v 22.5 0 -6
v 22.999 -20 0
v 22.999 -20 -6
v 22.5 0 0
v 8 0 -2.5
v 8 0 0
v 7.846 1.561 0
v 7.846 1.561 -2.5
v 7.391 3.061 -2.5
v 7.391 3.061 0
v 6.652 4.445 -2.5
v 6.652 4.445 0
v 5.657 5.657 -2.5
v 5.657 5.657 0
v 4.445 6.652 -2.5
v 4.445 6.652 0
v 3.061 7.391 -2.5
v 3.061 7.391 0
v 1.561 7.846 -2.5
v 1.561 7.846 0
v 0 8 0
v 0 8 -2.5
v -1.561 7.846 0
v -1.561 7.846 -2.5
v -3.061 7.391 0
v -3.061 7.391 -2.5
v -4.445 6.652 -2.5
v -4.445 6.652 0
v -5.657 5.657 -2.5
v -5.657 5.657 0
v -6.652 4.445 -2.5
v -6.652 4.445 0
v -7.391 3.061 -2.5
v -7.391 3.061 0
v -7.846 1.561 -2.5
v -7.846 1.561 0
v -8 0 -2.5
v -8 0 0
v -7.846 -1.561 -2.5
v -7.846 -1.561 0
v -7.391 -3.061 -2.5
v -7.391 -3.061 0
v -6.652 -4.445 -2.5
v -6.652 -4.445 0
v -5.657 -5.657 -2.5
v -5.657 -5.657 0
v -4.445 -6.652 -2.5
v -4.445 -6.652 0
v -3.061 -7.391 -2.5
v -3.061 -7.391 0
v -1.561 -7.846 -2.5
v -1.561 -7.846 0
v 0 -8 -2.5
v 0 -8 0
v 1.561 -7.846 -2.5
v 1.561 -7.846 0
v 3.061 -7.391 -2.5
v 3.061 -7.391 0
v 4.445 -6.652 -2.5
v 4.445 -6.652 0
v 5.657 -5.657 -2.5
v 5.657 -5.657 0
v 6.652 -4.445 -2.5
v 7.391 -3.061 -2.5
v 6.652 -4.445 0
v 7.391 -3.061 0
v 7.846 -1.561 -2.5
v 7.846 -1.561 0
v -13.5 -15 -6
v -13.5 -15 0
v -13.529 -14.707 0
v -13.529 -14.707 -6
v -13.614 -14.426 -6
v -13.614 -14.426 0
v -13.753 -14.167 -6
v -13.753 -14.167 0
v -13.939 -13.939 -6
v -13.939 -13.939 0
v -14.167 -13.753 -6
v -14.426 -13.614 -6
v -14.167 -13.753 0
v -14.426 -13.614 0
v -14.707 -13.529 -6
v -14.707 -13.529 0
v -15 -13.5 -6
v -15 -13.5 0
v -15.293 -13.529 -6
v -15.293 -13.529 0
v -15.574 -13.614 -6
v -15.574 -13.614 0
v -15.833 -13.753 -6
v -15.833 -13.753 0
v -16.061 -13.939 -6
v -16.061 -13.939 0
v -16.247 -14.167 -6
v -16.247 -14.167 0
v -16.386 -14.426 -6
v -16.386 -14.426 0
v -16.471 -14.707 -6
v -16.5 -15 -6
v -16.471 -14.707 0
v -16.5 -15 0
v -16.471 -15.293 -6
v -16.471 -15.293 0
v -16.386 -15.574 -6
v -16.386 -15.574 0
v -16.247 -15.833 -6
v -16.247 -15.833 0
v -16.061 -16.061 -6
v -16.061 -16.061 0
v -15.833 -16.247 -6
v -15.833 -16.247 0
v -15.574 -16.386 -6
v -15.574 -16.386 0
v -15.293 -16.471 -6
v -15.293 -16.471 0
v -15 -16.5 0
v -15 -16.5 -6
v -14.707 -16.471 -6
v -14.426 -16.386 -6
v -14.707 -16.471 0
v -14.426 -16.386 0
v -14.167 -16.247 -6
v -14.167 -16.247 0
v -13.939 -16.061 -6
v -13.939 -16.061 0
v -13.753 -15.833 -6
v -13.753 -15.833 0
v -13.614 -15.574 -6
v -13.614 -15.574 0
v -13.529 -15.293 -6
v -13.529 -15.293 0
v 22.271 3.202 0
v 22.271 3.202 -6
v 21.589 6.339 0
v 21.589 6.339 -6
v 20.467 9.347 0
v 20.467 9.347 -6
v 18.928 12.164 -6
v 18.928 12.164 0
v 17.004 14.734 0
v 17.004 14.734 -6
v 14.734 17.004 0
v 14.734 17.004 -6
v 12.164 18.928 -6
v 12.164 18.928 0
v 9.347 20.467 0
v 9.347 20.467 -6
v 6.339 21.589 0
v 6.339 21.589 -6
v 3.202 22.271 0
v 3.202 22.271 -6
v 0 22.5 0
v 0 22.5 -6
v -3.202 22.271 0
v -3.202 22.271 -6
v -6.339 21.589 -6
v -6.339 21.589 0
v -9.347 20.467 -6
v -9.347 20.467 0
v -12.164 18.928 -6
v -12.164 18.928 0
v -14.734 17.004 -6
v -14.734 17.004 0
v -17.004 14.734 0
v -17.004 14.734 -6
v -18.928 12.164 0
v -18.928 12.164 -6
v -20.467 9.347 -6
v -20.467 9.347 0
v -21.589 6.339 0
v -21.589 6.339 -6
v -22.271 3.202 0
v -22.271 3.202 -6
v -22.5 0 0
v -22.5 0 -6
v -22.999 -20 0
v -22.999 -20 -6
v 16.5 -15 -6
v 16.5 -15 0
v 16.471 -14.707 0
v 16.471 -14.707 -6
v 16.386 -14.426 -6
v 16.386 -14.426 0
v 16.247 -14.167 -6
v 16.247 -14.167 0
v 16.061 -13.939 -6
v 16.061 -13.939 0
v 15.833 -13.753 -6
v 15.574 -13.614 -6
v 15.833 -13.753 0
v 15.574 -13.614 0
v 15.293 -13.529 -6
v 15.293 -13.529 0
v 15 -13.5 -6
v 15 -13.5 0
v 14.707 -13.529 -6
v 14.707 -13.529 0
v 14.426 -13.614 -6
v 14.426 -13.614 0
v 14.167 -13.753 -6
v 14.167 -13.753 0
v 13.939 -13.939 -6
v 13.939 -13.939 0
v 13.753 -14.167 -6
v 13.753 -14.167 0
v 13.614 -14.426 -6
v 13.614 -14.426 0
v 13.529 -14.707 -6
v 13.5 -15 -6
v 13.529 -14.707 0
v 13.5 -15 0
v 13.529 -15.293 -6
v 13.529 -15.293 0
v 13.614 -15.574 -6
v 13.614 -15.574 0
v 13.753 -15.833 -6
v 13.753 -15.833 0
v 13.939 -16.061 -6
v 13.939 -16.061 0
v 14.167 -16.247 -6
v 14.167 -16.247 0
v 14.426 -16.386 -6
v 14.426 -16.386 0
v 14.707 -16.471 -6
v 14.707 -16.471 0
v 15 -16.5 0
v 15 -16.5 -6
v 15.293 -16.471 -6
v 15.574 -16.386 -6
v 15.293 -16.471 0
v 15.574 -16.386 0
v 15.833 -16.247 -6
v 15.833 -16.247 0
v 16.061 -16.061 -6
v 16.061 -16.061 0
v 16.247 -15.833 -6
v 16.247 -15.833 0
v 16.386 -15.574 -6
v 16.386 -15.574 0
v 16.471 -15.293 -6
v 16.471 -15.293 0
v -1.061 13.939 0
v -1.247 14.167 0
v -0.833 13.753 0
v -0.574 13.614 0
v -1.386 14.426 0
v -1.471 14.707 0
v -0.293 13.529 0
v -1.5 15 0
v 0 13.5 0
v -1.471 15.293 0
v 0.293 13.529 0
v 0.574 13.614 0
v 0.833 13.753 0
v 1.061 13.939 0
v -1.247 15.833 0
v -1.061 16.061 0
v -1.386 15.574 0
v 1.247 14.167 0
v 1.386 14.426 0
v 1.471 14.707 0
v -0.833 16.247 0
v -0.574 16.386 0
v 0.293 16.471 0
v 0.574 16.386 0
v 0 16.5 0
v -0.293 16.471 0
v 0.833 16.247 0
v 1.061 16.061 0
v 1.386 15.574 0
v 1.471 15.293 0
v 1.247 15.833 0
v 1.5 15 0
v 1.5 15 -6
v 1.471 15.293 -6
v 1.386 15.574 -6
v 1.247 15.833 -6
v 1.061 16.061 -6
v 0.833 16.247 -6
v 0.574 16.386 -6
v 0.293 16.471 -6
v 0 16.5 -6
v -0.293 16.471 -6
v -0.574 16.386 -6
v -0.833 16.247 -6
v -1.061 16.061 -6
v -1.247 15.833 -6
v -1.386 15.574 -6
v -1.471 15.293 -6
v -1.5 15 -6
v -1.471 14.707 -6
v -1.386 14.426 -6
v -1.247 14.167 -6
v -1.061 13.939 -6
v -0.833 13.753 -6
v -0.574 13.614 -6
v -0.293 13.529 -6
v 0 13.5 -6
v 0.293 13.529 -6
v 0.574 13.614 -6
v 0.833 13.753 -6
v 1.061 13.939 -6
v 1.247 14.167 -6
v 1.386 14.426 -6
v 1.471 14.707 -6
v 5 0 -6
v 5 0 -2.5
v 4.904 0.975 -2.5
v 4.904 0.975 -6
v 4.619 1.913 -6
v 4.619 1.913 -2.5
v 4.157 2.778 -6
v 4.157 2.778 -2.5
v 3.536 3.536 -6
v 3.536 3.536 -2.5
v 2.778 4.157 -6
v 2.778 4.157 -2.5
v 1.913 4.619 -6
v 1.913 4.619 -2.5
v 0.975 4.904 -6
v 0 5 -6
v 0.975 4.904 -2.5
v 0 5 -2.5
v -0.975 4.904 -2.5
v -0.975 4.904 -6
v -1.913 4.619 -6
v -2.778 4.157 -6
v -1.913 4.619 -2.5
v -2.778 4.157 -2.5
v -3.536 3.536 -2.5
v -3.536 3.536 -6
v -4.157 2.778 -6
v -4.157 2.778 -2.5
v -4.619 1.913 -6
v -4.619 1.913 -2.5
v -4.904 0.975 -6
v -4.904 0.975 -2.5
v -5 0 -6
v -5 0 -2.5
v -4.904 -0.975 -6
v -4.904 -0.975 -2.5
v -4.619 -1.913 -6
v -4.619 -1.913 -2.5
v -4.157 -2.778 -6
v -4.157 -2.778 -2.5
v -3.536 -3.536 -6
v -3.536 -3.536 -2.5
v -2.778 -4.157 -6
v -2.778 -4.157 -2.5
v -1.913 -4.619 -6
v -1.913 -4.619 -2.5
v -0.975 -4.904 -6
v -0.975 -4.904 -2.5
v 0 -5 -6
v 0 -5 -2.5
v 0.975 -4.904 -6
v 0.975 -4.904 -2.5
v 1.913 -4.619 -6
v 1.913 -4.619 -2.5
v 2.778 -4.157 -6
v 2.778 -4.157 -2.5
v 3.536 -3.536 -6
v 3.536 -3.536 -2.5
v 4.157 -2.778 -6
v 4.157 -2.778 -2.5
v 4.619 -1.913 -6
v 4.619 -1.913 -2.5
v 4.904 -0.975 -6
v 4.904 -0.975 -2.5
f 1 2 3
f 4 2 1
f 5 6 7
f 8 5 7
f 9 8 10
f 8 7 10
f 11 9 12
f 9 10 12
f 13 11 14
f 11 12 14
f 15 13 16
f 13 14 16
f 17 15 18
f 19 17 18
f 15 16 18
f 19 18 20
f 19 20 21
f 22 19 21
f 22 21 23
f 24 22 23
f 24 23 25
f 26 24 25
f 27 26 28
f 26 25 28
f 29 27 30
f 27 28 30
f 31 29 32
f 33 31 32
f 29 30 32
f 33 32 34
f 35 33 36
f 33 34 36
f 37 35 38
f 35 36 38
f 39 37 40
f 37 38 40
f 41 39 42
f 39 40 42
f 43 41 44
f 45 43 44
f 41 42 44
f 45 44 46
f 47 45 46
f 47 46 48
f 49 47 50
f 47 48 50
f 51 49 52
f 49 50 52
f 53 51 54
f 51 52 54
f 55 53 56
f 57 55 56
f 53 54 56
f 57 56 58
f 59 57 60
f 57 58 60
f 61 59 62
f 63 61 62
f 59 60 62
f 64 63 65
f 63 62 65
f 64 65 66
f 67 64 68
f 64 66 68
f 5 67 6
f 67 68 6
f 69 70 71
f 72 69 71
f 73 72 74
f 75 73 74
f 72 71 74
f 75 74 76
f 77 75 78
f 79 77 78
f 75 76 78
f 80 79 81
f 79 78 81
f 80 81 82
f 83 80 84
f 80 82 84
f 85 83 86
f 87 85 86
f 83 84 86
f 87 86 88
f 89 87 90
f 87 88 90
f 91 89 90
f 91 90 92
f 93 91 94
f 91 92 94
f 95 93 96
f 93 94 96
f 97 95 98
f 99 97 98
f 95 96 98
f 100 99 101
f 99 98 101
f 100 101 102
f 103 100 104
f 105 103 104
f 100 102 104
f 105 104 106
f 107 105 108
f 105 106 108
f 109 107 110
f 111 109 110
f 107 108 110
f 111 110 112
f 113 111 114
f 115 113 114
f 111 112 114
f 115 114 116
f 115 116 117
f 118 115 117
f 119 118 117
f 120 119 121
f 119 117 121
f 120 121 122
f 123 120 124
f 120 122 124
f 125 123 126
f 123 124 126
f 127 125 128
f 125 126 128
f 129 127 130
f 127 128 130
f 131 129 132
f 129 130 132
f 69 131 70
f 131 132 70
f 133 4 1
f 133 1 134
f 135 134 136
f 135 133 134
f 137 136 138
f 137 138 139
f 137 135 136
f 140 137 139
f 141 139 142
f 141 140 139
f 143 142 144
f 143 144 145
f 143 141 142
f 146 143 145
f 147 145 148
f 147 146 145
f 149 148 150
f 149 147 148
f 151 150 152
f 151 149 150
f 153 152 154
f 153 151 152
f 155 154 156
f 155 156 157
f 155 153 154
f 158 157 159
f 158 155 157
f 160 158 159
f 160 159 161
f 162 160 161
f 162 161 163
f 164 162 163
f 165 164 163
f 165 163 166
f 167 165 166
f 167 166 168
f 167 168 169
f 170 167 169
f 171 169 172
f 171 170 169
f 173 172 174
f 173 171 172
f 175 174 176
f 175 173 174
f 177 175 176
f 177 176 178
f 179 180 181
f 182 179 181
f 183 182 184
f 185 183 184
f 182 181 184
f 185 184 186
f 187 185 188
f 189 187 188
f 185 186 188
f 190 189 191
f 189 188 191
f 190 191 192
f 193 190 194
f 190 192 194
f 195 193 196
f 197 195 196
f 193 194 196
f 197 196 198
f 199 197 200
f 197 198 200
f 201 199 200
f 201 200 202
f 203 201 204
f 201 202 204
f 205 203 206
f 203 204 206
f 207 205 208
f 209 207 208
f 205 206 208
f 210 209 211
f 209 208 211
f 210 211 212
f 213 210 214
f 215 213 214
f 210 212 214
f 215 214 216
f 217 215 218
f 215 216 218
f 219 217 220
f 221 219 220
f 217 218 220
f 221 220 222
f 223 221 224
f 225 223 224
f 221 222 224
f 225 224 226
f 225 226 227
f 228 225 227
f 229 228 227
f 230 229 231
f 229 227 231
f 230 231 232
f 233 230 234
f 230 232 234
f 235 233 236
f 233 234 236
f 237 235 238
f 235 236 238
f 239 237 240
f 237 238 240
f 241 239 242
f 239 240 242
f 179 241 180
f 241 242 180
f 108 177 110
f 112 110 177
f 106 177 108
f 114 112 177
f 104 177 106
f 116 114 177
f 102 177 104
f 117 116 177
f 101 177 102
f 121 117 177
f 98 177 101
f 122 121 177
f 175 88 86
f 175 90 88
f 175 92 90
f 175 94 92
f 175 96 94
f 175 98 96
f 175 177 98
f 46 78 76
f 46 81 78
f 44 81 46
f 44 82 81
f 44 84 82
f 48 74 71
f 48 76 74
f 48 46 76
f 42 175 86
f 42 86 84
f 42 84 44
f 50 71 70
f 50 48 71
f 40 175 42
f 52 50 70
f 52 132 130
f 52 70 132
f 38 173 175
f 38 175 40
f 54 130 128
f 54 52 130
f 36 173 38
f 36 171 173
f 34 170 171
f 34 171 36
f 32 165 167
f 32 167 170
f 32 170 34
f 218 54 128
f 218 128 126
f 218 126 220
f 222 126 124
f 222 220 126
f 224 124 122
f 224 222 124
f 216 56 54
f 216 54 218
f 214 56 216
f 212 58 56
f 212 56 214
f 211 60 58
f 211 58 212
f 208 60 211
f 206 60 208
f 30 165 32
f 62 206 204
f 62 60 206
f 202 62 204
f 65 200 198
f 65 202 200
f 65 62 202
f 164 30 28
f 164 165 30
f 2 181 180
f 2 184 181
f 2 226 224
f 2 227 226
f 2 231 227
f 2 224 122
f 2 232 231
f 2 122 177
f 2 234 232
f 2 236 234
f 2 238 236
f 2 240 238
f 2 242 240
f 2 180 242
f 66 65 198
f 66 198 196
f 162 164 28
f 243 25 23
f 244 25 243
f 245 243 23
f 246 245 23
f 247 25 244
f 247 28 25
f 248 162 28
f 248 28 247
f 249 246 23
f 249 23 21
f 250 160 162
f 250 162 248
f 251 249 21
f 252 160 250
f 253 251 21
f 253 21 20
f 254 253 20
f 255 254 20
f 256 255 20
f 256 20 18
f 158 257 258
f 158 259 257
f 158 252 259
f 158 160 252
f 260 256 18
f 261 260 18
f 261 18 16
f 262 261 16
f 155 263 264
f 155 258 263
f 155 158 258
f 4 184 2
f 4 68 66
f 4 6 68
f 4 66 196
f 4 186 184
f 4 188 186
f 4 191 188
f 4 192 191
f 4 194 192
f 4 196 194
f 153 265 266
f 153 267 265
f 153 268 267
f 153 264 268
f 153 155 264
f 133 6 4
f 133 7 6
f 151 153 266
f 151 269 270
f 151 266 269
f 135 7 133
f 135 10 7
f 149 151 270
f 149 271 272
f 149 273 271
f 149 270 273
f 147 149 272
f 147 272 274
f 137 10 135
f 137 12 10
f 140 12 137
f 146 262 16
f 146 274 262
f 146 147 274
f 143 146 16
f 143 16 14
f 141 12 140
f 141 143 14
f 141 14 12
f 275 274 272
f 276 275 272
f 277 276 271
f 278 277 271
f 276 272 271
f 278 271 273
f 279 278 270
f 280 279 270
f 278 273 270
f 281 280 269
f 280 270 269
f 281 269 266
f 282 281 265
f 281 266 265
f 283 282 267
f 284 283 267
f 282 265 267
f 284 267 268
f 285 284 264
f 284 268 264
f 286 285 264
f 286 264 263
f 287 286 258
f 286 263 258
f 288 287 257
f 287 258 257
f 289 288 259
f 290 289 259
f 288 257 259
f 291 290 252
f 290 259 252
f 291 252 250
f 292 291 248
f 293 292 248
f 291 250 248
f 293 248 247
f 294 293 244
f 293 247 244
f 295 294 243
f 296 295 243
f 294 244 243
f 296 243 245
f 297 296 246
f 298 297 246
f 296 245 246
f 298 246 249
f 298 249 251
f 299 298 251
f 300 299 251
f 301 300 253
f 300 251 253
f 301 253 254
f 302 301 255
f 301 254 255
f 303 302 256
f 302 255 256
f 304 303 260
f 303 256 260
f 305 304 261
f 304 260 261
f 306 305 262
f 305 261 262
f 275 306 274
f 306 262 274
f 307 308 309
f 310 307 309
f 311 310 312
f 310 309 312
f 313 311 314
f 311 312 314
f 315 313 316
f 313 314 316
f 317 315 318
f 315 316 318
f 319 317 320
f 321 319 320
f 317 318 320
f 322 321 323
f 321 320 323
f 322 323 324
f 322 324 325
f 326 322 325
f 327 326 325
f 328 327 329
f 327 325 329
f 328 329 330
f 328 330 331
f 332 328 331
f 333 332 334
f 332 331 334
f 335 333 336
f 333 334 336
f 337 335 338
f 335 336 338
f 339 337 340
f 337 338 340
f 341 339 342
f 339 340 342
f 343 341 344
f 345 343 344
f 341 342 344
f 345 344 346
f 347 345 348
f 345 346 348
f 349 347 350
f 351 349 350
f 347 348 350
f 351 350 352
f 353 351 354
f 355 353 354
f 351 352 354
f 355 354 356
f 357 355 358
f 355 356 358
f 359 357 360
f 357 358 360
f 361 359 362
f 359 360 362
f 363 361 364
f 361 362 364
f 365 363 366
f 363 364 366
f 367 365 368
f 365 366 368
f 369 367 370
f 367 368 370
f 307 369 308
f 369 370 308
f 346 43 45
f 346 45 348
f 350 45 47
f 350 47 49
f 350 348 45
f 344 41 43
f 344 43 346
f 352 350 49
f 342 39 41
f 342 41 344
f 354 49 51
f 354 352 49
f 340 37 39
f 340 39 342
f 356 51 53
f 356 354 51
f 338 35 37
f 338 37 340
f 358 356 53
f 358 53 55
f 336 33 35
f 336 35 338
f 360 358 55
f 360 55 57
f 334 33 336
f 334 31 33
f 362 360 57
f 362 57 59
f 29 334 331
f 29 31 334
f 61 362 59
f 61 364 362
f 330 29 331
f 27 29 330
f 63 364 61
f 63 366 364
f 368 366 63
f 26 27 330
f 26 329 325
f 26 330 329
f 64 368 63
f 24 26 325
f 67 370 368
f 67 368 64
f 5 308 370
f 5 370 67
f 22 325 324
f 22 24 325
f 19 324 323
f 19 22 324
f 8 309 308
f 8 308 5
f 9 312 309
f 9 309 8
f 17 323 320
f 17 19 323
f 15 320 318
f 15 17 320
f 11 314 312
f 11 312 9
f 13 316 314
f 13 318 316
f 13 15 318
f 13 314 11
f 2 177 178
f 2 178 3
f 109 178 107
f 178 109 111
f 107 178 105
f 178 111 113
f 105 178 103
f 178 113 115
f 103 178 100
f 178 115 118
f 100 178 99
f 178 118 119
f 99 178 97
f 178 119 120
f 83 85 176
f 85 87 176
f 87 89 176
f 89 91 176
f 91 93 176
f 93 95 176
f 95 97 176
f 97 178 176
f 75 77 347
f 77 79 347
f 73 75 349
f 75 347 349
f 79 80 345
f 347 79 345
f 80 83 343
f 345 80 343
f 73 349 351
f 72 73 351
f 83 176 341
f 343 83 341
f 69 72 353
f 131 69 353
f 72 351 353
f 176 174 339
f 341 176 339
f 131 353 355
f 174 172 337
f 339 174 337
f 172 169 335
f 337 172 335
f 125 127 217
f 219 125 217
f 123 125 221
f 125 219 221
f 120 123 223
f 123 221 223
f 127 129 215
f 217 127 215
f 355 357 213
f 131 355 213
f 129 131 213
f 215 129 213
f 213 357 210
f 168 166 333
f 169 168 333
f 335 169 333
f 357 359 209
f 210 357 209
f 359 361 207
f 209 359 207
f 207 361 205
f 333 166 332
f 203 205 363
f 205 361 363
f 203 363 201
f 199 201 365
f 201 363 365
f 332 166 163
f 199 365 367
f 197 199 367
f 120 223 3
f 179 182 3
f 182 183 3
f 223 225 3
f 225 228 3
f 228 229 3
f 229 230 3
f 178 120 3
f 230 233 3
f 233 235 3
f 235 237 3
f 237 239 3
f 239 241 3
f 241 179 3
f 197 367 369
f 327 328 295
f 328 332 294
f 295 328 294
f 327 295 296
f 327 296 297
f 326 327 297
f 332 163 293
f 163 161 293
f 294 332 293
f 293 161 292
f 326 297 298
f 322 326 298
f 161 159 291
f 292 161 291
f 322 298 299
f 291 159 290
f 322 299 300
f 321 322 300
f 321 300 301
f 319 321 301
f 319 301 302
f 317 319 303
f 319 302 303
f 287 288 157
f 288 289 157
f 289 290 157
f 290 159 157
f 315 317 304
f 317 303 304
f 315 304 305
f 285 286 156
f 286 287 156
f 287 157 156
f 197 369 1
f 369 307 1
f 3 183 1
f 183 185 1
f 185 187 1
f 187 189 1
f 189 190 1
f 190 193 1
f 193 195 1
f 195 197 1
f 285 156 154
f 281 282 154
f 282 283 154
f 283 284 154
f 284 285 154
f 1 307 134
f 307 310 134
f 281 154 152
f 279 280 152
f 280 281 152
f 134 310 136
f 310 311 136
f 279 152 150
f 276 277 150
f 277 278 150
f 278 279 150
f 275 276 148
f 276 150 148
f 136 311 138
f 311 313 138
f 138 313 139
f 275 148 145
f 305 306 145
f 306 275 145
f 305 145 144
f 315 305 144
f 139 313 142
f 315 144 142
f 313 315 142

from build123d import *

# Parameters (mm, degrees)
BEARING_HOLDER_BOSS_EXTRUDE1_DEPTH = 6
SKETCH2_R                          = 8
BEARING_HOLE_CUT_EXTRUDE1_DEPTH    = 2.5
SKETCH3_R                          = 5
SHAFT_HOLE_CUT_EXTRUDE2_DEPTH      = 3.5
SKETCH4_R                          = 1.5
MOUNTING_HOLES_CUT_EXTRUDE3_DEPTH  = 6


with BuildPart() as part:
    # Sketch1 → Bearing Holder Boss-Extrude1 (new body)
    with BuildSketch(Plane.XY):
        with BuildLine():
            Line((-22.5, 0), (-22.999267837, -20))
            Line((-22.999267837, -20), (0, -20))
            Line((0, -20), (22.999267837, -20))
            Line((22.999267837, -20), (22.5, 0))
            ThreePointArc((22.5, 0), (0, 22.5), (-22.5, 0))
        make_face()
    extrude(amount=-BEARING_HOLDER_BOSS_EXTRUDE1_DEPTH)

    # Sketch2 → Bearing Hole Cut-Extrude1 (cut)
    with BuildSketch(Plane.XY):
        Circle(SKETCH2_R)
    extrude(amount=-BEARING_HOLE_CUT_EXTRUDE1_DEPTH, mode=Mode.SUBTRACT)

    # Sketch3 → Shaft Hole Cut-Extrude2 (cut)
    with BuildSketch(Plane.XY.offset(-2.5)):
        Circle(SKETCH3_R)
    extrude(amount=-SHAFT_HOLE_CUT_EXTRUDE2_DEPTH, mode=Mode.SUBTRACT)

    # Sketch4 → Mounting Holes Cut-Extrude3 (cut)
    with BuildSketch(Plane.XY):
        with Locations((0, 15)):
            Circle(SKETCH4_R)
        with Locations((-15, -15)):
            Circle(SKETCH4_R)
        with Locations((15, -15)):
            Circle(SKETCH4_R)
    extrude(amount=-MOUNTING_HOLES_CUT_EXTRUDE3_DEPTH, mode=Mode.SUBTRACT)


solid = part.part
